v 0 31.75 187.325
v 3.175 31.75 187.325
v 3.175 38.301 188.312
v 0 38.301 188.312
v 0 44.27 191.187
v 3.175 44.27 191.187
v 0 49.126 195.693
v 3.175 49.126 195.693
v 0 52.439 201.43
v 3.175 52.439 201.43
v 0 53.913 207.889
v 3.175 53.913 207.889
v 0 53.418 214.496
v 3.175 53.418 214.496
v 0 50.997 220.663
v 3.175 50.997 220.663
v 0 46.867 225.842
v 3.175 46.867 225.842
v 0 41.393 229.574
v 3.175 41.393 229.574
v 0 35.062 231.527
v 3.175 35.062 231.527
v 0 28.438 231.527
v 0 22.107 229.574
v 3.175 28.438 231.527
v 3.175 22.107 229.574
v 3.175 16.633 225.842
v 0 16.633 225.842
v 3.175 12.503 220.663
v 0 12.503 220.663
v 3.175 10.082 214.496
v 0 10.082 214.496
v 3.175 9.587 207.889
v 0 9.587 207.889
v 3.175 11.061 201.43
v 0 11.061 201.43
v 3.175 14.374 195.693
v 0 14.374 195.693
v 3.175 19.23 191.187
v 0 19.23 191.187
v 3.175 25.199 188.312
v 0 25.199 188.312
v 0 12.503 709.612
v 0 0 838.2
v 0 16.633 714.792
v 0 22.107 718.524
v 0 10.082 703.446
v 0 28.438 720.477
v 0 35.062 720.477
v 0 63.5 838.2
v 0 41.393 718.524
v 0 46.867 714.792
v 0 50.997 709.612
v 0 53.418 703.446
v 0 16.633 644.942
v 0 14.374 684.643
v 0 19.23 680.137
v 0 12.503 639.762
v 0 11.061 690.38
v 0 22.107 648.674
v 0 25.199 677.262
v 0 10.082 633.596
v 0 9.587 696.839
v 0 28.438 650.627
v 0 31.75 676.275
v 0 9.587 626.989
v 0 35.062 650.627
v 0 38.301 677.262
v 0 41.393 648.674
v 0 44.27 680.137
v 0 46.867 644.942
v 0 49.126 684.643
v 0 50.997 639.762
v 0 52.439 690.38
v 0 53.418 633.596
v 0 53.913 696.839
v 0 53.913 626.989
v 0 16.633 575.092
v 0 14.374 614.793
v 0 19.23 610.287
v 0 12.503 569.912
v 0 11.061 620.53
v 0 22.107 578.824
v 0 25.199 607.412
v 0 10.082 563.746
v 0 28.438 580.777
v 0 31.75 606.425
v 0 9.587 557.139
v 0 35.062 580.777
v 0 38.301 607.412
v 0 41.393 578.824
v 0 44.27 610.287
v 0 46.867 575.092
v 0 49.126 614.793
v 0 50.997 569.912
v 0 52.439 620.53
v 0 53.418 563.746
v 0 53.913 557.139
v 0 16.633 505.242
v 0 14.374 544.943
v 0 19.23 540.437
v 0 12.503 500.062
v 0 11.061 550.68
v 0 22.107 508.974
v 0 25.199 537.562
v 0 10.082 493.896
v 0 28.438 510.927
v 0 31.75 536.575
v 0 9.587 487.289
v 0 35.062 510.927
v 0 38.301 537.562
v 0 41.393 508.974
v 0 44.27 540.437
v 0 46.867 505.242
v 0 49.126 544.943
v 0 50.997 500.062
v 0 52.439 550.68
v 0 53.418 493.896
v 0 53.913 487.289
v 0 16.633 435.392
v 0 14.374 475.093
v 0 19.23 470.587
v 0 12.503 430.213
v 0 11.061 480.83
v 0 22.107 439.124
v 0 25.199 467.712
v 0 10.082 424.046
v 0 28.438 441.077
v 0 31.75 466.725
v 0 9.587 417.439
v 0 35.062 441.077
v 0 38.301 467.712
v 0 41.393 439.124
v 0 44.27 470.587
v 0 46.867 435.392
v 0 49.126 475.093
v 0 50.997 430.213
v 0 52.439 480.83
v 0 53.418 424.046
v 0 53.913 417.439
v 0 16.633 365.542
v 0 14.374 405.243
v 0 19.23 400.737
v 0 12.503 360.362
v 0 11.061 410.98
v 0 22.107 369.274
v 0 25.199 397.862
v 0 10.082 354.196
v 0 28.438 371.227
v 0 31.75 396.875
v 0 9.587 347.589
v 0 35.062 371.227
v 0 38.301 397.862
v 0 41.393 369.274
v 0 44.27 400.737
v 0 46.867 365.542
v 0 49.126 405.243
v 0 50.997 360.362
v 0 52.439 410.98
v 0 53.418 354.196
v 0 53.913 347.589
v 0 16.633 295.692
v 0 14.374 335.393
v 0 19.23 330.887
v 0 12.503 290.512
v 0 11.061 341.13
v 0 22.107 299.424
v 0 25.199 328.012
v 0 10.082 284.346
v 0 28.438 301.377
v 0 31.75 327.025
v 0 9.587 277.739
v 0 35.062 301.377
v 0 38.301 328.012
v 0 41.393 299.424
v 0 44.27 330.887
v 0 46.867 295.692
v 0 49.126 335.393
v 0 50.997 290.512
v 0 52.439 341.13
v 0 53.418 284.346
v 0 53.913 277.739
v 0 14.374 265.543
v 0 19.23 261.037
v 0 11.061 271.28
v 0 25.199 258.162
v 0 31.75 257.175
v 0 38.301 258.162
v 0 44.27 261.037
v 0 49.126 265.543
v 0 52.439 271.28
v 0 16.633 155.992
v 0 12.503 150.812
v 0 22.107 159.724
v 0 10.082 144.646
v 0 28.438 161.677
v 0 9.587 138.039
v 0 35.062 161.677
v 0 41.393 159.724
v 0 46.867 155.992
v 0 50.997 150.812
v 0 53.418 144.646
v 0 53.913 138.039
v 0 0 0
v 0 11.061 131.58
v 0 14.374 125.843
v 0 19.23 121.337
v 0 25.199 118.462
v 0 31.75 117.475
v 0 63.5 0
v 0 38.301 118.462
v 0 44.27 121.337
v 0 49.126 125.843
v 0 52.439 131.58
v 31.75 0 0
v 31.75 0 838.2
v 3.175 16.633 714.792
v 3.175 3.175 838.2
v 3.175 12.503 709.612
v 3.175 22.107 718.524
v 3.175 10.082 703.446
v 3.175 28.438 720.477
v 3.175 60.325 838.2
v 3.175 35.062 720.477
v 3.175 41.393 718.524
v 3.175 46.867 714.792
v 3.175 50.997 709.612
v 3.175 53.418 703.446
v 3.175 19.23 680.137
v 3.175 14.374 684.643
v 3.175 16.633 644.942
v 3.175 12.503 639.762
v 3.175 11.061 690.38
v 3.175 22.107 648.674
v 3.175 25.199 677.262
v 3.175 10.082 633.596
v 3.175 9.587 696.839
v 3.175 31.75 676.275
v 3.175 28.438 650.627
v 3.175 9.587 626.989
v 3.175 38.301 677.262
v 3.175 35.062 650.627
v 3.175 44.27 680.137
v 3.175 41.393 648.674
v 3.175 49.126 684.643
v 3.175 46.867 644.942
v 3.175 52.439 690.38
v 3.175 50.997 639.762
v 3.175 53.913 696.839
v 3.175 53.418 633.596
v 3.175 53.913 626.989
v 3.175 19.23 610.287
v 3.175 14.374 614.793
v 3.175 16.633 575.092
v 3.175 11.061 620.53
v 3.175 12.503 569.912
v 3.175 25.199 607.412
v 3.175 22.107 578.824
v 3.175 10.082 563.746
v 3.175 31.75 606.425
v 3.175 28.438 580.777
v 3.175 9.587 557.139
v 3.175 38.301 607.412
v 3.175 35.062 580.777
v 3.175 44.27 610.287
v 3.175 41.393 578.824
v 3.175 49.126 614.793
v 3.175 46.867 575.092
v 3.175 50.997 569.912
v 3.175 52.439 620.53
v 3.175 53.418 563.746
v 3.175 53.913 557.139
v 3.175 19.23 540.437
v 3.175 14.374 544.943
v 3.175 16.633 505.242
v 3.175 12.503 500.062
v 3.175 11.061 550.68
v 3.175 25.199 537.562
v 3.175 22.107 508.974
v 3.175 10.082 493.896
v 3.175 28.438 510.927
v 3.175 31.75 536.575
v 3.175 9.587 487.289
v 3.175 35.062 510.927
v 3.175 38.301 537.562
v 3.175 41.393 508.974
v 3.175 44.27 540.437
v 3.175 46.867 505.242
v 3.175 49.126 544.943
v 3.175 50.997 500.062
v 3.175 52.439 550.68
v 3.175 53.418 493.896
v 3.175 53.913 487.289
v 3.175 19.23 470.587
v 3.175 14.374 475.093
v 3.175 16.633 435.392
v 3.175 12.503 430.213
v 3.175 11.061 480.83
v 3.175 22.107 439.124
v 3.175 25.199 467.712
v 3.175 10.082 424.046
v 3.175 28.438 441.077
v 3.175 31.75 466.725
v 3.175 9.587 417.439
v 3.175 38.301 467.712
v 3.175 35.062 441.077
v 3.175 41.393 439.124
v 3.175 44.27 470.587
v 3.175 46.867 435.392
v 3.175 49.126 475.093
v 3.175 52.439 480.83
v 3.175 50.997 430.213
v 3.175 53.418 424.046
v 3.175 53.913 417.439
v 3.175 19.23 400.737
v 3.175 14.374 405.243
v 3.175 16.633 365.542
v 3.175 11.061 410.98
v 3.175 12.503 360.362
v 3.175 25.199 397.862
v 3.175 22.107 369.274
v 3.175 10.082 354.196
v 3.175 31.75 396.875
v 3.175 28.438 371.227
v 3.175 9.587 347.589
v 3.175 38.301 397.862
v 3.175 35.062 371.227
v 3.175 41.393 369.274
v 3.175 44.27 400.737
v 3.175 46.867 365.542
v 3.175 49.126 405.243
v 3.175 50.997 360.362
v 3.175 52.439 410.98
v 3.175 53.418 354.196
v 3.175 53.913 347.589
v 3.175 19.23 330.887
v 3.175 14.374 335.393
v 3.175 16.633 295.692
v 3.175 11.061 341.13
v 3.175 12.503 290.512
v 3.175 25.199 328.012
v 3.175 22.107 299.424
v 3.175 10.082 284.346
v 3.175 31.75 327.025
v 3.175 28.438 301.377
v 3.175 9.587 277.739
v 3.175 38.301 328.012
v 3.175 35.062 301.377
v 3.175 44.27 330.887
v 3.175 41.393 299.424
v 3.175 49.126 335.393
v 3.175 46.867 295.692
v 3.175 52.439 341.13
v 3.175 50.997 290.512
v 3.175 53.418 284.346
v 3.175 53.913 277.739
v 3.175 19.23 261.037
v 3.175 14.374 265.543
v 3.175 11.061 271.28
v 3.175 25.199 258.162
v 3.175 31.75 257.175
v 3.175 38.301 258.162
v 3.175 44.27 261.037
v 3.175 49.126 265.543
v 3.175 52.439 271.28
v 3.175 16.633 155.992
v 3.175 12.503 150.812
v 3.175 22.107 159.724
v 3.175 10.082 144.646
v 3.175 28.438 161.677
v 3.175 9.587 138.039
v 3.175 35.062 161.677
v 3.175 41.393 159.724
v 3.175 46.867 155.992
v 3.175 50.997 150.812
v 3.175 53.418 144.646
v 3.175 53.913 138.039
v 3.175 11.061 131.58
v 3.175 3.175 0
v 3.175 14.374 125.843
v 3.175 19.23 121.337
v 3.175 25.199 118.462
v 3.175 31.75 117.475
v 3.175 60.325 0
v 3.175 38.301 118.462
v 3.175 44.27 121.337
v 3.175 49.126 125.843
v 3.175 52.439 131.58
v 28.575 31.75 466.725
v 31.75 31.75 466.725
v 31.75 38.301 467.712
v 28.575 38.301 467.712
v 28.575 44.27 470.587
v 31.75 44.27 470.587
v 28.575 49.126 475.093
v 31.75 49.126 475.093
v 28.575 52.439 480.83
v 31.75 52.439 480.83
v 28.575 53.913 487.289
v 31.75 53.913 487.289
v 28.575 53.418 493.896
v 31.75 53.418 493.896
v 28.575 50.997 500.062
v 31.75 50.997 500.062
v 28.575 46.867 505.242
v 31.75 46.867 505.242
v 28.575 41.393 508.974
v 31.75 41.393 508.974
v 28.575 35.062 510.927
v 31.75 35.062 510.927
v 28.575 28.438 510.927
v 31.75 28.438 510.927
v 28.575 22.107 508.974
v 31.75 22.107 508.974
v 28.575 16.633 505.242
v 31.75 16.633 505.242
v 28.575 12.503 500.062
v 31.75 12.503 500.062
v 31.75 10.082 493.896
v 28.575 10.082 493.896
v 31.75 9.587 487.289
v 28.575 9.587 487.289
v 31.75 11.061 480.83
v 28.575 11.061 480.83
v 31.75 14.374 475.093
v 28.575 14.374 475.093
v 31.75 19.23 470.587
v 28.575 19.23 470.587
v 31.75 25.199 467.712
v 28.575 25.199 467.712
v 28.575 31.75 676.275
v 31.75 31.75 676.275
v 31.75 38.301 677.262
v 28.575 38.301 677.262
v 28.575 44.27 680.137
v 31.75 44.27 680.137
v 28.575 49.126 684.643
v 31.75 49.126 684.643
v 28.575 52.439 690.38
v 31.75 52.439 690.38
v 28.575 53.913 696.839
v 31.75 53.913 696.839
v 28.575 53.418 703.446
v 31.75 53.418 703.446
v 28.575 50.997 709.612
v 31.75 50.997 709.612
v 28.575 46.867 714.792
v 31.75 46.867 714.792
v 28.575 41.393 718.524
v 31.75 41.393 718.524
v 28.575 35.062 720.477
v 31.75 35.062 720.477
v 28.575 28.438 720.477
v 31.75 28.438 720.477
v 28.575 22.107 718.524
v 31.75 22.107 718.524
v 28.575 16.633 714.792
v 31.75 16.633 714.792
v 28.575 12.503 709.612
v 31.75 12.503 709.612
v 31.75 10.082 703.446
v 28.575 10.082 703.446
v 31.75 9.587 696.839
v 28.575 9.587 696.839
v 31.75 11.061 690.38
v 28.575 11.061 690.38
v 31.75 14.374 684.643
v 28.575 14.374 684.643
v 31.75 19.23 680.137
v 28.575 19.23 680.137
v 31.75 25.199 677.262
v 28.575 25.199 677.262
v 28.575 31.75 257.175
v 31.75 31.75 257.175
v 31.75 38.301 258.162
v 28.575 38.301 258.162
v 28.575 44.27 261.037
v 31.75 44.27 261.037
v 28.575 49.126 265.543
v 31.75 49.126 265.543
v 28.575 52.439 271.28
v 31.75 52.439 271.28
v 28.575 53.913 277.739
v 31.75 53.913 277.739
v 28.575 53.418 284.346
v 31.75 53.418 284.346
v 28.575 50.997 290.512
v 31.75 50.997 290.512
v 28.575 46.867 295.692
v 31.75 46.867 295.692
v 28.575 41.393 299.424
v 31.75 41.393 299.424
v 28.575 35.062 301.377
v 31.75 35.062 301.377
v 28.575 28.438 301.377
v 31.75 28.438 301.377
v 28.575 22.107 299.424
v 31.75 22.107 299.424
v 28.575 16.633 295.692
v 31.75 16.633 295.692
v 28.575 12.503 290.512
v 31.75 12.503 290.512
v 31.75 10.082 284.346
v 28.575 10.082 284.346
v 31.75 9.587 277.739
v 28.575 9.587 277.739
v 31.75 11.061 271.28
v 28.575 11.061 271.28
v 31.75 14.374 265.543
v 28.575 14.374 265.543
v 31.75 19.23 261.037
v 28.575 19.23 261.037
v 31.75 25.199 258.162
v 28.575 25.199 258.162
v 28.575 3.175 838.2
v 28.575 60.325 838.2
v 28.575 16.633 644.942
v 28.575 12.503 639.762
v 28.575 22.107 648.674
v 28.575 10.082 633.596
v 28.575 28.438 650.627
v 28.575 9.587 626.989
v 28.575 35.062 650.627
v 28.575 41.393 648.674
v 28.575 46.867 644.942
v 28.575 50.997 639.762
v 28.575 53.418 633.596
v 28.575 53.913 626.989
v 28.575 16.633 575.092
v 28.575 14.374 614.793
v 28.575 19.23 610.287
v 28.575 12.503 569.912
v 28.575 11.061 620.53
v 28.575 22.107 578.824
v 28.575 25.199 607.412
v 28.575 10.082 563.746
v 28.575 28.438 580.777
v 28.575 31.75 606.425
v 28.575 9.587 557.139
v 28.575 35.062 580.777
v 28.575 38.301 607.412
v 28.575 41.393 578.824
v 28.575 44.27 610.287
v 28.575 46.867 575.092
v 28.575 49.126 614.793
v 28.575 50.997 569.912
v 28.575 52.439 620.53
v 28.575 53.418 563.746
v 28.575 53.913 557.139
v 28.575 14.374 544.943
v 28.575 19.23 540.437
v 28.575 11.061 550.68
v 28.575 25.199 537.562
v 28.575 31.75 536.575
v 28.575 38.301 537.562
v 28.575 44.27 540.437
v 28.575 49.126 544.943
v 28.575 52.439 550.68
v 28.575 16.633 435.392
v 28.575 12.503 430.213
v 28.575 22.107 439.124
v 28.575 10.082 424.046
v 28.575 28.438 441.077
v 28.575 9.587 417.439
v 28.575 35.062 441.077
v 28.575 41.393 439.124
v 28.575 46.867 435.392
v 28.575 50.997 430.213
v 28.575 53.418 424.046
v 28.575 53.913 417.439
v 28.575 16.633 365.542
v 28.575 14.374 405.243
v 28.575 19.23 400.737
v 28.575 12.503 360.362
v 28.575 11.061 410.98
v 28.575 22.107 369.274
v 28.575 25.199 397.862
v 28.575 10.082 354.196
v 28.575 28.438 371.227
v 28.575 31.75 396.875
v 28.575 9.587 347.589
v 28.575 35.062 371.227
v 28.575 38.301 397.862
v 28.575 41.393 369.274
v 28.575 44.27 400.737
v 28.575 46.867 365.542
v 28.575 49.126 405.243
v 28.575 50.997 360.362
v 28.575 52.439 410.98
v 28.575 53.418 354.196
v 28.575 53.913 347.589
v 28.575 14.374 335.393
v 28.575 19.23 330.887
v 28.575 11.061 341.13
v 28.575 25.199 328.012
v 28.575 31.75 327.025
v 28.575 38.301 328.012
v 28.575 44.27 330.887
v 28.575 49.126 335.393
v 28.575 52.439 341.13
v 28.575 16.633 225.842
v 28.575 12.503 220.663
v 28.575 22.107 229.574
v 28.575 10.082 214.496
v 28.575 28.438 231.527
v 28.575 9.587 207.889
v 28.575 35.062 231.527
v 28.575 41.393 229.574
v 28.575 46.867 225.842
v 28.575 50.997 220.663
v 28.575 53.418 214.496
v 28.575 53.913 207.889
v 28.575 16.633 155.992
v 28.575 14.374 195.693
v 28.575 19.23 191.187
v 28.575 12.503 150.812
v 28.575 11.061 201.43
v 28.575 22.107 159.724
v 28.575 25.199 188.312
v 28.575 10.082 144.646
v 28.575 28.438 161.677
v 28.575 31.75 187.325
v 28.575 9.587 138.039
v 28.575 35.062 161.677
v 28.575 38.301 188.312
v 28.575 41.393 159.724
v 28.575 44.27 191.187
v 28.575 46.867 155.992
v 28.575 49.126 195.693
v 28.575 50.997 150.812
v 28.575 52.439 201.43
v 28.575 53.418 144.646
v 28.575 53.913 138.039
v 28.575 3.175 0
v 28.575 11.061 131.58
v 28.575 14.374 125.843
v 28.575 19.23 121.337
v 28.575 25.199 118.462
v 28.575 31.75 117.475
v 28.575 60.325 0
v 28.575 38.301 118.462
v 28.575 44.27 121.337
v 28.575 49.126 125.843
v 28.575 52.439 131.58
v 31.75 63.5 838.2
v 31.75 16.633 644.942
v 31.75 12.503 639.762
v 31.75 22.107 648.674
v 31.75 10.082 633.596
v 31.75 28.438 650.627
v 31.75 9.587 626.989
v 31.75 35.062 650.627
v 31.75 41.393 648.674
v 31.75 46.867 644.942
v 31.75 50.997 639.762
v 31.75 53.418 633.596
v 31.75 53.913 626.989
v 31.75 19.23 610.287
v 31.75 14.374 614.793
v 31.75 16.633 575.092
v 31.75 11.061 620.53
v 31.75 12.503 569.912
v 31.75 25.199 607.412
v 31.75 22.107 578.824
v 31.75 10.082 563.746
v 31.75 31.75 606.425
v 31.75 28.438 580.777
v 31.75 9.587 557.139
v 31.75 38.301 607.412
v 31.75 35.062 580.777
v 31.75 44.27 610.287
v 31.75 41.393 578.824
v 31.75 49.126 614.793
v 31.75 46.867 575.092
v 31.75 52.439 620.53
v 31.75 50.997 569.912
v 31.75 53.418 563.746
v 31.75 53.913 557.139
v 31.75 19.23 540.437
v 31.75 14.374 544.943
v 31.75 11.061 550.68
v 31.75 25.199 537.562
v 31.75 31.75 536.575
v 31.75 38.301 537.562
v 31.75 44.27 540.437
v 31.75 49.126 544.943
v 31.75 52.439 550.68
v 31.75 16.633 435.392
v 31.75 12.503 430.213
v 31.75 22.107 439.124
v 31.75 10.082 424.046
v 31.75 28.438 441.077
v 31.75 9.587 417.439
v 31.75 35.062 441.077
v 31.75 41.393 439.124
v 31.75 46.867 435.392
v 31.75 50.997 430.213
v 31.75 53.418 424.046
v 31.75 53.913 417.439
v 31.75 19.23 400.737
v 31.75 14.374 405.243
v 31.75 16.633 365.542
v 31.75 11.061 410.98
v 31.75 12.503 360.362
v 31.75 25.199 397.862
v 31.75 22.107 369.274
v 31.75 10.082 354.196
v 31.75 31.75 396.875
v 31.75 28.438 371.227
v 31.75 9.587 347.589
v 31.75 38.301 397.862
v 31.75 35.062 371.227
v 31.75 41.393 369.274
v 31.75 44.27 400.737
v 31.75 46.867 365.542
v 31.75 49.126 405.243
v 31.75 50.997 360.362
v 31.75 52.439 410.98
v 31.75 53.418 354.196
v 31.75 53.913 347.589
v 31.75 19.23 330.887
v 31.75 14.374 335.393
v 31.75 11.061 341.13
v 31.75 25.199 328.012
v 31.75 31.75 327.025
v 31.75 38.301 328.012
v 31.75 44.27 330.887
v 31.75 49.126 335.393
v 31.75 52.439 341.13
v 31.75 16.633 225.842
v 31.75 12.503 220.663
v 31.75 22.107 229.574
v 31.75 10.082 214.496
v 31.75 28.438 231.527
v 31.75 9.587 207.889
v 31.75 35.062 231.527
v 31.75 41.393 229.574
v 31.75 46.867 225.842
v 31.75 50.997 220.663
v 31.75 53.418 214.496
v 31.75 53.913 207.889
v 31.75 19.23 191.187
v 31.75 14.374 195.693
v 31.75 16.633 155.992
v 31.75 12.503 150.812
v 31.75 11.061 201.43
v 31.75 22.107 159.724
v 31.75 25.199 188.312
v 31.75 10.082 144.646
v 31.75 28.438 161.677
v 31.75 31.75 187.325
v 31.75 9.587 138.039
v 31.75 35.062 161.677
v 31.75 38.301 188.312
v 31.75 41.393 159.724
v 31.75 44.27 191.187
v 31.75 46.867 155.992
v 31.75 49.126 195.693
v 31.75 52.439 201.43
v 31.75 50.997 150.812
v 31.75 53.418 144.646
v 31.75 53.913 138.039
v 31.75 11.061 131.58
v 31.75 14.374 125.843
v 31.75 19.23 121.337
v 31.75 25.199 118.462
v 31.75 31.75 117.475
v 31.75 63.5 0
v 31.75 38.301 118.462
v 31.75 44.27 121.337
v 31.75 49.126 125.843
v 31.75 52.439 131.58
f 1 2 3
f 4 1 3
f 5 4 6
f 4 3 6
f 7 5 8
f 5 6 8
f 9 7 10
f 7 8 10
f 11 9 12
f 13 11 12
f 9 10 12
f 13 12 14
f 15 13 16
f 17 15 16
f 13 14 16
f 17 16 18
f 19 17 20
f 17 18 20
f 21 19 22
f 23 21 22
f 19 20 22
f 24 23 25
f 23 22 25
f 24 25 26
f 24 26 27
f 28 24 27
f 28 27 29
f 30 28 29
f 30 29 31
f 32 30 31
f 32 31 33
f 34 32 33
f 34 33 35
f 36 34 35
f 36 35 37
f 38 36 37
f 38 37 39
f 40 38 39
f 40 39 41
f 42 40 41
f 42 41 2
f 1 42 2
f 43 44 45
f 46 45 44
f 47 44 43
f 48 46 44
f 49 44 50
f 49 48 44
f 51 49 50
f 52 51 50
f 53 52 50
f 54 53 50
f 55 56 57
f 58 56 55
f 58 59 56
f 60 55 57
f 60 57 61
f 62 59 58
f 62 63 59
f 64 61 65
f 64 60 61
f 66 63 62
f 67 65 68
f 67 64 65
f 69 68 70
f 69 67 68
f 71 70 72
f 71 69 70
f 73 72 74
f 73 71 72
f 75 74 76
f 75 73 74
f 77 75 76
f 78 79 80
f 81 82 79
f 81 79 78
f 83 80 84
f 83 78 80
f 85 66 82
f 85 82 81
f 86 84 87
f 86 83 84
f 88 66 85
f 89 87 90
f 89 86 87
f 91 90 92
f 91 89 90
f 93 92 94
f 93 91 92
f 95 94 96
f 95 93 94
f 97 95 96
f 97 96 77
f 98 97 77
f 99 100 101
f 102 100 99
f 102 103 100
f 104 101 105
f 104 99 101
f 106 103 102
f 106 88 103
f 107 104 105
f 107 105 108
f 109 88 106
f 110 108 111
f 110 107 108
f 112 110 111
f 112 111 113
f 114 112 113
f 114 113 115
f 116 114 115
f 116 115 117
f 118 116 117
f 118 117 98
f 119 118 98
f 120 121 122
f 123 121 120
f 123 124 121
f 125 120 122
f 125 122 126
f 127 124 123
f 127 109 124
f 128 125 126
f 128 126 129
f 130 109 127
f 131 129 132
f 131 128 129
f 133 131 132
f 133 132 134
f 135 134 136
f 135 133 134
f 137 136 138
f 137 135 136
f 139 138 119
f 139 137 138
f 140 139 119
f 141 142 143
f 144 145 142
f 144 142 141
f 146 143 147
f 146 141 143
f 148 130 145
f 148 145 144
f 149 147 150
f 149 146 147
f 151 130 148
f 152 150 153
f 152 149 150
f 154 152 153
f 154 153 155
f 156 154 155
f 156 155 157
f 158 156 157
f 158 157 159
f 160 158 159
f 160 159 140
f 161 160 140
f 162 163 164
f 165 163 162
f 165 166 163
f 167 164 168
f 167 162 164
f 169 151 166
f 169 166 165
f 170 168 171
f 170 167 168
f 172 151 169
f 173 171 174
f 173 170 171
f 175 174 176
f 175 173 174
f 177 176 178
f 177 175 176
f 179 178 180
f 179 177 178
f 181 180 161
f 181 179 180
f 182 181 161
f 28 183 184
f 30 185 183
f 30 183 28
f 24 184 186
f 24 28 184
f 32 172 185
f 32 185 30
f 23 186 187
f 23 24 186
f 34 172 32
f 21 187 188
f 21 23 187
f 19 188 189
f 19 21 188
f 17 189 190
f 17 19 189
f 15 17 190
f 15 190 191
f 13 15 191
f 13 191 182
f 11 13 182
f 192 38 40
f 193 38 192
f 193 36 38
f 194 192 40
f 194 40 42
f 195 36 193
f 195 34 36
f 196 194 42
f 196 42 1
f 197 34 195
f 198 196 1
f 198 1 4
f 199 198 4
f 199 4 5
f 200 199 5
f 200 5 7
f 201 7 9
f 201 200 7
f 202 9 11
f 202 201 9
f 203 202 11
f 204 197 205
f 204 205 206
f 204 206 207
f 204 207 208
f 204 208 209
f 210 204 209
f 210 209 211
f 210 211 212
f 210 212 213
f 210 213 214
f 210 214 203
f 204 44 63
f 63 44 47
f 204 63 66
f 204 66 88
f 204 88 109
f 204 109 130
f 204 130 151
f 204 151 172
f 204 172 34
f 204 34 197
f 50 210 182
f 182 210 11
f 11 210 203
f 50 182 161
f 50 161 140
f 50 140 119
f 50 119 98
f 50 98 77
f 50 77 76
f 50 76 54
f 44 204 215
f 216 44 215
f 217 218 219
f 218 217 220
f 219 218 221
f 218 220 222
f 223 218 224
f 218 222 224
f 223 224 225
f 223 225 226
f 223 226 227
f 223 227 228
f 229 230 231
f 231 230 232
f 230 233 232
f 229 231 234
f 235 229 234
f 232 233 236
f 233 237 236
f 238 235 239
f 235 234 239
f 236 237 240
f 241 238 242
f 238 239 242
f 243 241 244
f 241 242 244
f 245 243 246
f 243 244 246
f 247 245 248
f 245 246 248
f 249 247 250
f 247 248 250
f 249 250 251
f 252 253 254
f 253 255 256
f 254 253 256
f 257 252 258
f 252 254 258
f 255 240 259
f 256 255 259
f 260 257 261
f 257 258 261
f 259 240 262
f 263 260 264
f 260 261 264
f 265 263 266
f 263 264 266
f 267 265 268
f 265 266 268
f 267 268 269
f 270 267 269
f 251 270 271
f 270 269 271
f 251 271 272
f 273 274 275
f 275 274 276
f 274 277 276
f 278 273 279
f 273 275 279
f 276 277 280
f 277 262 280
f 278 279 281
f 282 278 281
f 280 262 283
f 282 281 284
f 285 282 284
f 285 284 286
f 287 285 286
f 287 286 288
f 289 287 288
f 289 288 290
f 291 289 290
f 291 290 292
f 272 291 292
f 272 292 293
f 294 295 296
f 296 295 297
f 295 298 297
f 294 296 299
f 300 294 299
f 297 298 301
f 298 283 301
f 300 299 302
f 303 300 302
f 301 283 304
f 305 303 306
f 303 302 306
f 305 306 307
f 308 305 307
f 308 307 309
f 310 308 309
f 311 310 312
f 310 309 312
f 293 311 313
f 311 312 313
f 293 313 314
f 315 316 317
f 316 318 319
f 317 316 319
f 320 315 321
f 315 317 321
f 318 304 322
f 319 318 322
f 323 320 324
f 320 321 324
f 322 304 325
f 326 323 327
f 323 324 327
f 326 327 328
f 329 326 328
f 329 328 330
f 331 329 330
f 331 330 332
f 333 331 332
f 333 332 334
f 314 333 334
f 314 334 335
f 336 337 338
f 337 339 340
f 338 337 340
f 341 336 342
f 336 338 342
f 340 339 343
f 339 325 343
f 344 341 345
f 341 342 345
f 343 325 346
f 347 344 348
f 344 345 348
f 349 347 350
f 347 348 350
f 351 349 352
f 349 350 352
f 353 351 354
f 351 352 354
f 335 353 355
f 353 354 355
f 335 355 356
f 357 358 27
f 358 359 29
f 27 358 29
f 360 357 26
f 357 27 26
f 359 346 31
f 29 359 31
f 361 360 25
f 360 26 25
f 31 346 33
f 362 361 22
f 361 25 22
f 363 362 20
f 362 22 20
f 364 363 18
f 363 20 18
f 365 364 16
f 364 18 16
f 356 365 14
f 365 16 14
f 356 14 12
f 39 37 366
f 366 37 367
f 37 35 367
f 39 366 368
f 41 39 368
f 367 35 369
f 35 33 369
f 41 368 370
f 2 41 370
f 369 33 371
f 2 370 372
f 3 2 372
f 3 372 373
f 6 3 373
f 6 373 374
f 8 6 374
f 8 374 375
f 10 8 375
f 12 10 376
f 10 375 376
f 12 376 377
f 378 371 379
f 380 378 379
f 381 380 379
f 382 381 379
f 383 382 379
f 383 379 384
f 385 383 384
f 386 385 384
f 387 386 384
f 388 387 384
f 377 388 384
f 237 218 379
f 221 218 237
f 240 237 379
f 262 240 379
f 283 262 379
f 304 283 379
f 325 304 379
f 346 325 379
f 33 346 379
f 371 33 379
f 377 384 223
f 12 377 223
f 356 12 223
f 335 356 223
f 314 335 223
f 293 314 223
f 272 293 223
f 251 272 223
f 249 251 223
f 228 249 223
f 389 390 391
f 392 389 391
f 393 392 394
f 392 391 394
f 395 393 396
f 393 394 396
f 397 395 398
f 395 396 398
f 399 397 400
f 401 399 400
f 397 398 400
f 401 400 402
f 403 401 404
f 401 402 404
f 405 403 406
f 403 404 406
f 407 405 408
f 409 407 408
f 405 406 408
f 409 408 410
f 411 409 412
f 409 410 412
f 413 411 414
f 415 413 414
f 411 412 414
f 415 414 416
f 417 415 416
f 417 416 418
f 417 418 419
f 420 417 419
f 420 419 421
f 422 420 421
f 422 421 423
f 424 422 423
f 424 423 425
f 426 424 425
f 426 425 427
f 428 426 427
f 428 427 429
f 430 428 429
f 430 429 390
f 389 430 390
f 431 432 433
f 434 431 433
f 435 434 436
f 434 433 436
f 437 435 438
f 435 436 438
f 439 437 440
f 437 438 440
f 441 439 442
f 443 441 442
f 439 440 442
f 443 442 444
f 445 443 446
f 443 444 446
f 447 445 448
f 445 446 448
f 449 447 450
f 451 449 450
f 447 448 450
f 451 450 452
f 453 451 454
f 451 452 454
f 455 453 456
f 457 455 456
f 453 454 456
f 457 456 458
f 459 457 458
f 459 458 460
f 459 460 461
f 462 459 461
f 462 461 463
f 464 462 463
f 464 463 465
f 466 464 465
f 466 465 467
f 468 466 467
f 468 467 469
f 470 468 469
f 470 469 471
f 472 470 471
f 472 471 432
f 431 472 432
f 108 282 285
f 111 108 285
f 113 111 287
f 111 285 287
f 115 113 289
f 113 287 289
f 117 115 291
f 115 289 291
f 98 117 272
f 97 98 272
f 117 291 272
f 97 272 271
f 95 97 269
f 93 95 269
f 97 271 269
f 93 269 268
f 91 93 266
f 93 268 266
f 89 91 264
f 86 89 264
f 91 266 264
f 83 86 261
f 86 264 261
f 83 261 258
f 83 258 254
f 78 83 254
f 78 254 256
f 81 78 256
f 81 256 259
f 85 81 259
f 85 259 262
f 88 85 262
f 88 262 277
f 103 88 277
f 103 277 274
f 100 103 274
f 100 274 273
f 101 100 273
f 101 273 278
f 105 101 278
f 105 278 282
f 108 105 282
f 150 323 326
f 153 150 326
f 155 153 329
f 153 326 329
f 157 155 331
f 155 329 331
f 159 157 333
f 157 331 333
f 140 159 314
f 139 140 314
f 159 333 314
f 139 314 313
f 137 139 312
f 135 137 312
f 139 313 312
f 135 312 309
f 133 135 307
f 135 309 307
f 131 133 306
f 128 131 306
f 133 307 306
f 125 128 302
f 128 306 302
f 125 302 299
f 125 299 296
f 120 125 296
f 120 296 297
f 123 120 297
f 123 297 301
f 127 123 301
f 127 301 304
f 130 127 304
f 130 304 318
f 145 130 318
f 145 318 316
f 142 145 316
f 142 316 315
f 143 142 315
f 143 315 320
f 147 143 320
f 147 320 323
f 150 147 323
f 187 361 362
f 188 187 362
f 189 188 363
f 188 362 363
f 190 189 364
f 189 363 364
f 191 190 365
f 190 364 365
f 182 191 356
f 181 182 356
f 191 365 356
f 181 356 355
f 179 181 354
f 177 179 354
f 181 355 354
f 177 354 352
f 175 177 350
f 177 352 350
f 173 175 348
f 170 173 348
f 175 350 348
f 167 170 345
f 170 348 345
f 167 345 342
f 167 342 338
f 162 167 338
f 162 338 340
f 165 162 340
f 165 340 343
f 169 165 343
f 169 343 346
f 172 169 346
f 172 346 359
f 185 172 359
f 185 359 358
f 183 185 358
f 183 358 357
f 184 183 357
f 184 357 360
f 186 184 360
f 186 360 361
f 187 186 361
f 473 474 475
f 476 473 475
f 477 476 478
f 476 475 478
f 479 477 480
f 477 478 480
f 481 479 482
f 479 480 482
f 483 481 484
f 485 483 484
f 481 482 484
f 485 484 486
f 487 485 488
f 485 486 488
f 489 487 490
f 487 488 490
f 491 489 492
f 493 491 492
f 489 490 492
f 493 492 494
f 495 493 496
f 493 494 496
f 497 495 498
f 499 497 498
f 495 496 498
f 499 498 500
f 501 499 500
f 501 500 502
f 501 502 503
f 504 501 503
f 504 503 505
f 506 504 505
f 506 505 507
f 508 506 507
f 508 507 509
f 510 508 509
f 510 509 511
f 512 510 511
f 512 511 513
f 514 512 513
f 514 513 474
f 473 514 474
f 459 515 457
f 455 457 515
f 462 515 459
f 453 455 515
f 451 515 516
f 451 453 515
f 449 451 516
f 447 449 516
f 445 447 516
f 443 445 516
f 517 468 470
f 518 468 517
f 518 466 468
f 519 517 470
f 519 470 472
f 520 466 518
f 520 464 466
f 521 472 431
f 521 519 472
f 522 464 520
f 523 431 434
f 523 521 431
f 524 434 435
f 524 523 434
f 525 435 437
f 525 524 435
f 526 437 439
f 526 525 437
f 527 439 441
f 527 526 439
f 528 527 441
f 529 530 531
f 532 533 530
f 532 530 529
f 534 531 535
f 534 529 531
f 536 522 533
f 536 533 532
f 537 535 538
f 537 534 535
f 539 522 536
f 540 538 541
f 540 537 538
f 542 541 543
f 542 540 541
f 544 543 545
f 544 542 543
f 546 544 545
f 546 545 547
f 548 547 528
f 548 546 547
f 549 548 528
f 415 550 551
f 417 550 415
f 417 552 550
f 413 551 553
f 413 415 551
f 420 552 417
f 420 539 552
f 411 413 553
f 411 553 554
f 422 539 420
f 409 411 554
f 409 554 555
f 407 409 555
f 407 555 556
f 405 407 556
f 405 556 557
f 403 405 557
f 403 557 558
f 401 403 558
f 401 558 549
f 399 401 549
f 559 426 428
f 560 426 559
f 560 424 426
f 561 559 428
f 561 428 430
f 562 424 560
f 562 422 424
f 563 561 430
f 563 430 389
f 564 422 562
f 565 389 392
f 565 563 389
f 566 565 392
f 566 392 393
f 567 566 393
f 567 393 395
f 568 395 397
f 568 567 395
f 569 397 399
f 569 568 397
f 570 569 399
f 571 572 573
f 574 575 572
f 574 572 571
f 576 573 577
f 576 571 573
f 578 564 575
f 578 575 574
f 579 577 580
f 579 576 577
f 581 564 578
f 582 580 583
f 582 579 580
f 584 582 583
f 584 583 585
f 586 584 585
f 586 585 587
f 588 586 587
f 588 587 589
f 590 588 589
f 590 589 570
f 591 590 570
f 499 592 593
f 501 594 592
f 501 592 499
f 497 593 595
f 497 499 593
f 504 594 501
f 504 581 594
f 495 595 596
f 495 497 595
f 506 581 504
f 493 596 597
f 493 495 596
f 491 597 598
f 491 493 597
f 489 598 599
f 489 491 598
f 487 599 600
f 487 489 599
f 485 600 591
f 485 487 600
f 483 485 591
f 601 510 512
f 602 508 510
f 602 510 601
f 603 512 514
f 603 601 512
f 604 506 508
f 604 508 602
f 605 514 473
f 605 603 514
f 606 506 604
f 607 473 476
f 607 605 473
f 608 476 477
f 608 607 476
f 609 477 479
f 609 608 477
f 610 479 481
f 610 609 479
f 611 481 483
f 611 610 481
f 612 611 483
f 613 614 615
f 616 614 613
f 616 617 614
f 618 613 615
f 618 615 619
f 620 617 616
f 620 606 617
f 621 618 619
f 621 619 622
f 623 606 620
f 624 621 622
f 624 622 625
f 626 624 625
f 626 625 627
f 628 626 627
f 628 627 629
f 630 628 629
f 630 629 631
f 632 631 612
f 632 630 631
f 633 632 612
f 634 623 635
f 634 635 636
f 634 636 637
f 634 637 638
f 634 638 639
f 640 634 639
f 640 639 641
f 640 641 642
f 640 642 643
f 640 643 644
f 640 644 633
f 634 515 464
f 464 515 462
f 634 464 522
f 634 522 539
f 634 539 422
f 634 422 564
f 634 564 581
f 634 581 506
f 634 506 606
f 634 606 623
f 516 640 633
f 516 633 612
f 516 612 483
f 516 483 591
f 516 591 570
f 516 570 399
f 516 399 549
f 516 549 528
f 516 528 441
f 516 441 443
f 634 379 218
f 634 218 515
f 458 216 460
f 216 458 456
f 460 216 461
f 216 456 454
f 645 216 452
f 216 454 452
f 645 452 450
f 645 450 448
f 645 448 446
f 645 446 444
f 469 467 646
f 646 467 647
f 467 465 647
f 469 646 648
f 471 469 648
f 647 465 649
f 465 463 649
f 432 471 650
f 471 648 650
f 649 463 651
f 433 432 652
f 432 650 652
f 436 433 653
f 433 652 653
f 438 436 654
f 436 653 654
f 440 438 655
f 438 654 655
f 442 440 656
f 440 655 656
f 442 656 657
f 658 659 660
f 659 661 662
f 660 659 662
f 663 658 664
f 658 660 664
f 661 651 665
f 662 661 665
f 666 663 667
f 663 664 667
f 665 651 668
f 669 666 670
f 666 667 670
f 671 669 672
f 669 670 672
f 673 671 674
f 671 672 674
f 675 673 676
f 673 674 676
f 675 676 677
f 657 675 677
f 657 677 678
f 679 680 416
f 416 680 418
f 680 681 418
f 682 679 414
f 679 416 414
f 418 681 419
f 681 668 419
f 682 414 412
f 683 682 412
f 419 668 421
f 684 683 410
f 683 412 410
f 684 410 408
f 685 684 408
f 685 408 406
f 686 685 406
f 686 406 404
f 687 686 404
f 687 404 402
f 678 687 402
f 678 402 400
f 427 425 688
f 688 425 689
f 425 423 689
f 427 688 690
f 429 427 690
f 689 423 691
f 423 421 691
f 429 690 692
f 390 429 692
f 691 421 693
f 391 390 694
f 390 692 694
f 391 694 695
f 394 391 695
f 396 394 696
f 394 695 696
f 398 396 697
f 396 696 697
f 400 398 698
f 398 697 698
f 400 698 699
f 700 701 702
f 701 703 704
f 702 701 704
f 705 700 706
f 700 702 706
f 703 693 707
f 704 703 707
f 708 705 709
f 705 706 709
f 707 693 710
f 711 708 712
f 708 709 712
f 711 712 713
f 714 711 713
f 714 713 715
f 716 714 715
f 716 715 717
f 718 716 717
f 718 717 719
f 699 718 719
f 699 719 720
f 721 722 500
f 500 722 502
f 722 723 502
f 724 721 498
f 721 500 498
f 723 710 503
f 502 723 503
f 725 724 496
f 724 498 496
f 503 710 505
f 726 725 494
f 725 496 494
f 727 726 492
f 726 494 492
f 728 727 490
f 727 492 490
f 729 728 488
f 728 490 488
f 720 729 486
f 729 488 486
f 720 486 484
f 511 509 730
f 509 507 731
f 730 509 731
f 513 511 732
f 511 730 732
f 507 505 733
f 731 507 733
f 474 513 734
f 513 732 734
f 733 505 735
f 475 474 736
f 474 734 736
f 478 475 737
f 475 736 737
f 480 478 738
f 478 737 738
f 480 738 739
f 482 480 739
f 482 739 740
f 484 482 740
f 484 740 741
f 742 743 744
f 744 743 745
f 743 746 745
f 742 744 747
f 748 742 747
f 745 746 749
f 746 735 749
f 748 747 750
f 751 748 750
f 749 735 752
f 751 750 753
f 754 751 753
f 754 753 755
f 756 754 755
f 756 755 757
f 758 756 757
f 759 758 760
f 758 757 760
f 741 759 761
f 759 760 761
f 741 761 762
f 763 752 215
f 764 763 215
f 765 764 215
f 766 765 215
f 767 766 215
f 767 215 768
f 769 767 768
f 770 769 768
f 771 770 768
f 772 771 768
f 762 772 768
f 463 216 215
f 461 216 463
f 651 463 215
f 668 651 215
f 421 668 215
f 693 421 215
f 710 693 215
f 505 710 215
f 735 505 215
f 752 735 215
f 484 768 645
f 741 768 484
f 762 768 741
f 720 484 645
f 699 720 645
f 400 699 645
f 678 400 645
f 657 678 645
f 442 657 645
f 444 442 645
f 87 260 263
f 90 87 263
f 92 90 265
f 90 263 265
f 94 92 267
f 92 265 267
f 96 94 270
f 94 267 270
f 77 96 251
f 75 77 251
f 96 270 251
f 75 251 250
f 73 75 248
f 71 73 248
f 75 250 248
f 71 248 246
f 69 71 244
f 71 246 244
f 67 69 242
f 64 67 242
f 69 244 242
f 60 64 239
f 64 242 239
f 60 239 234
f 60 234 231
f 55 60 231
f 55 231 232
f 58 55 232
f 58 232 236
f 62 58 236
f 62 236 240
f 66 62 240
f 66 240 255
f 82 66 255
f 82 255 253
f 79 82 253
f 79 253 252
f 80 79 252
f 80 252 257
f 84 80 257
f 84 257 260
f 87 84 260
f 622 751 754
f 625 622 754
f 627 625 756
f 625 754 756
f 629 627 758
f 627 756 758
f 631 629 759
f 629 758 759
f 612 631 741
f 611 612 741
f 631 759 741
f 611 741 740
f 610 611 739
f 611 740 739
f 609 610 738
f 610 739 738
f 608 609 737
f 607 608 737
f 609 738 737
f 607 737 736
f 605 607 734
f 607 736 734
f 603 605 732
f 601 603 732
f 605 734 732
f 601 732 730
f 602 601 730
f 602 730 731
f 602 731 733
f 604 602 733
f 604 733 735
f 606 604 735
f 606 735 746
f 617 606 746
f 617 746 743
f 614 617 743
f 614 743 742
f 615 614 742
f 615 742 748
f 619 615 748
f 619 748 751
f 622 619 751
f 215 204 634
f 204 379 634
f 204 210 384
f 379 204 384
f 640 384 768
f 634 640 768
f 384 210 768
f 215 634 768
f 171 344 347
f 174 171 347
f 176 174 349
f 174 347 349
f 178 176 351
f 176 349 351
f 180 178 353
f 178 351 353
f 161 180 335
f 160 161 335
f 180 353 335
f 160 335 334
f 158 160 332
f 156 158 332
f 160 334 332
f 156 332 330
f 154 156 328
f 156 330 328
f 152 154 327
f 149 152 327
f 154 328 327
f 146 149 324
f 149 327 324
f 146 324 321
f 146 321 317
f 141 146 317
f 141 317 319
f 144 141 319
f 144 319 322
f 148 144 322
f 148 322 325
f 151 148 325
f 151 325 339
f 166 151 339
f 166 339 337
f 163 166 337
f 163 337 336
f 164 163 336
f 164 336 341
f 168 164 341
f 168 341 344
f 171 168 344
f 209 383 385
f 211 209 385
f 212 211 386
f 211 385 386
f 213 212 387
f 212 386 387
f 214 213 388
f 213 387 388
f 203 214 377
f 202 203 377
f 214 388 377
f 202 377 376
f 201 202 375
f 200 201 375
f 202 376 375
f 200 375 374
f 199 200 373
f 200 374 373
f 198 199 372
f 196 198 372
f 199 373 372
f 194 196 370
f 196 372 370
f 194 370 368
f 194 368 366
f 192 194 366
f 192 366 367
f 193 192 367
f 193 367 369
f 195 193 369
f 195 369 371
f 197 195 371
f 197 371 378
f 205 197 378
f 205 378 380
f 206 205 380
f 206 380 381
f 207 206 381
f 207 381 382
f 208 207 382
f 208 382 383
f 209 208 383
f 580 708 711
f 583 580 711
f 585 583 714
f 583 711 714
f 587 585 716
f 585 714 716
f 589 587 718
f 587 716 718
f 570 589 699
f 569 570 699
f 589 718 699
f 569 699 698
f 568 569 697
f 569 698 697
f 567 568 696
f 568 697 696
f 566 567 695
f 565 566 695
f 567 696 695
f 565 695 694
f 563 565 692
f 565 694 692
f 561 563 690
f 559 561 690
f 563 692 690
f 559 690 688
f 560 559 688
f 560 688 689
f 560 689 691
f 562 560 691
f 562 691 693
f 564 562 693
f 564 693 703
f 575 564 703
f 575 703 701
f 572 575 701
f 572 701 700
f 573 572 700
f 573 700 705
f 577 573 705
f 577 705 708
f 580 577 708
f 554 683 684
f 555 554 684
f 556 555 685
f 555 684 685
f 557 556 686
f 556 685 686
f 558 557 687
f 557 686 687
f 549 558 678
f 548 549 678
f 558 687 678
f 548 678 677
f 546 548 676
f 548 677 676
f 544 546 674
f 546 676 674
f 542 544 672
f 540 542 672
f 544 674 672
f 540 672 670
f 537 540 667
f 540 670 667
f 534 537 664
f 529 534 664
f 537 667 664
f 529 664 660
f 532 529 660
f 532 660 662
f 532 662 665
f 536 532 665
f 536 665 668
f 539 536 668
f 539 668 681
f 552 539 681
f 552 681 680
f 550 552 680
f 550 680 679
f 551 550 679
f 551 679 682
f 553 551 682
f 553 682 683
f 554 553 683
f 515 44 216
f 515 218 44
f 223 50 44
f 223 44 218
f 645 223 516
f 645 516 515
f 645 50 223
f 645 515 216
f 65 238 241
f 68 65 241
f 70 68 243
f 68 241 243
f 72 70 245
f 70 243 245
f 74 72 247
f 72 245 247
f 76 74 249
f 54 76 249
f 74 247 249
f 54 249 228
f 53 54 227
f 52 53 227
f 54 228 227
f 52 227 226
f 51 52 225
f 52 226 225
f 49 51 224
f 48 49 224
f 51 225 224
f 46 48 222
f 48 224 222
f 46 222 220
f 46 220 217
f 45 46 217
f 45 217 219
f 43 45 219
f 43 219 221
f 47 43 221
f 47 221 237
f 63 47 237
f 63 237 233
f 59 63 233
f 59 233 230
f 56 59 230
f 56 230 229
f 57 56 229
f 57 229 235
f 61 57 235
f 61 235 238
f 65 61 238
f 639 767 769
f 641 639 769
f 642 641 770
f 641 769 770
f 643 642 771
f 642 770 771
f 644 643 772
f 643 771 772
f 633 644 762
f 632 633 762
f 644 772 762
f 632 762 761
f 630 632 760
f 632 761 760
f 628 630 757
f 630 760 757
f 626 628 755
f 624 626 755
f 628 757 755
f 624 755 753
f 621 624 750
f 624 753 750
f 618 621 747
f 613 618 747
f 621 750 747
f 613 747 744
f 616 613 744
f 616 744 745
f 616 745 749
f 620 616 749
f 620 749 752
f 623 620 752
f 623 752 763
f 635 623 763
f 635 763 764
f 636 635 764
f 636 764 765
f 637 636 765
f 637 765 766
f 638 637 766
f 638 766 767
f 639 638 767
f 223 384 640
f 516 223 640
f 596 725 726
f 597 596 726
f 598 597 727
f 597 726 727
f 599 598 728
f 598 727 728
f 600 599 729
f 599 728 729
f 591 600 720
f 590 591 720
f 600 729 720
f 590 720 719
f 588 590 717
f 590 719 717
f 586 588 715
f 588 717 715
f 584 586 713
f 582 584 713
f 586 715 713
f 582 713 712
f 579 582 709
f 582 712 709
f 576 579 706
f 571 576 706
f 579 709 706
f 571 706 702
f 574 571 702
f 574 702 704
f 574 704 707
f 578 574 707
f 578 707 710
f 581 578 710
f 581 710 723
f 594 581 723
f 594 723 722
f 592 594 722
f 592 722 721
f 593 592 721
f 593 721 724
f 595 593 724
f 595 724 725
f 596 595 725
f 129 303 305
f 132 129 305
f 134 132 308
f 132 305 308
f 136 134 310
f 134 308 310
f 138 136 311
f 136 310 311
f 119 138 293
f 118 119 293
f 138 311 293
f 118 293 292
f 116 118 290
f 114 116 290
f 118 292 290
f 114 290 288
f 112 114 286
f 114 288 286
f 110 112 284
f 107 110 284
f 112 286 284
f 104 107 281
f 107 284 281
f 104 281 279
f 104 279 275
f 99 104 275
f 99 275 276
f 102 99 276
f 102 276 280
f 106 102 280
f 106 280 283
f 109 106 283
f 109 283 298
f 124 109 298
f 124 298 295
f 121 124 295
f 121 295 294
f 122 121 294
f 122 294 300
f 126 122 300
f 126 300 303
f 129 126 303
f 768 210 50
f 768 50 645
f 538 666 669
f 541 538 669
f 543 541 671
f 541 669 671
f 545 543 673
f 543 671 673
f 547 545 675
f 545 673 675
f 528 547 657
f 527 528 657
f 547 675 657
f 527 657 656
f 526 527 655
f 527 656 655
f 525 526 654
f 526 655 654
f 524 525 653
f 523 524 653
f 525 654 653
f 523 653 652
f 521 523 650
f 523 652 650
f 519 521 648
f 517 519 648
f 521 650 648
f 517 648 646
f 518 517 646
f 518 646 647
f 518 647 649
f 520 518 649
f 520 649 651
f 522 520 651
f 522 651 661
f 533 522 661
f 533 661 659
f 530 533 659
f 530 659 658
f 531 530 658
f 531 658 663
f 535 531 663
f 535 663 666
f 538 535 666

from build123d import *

# Parameters (mm, degrees)
SKETCH1_W           = 31.75
SKETCH1_H           = 63.5
SKETCH1_W_2         = 25.4
SKETCH1_H_2         = 57.15
BOSS_EXTRUDE1_DEPTH = 838.2
SKETCH2_R           = 22.225
CUT_EXTRUDE1_DEPTH  = 31.75


with BuildPart() as part:
    # Sketch1 → Boss-Extrude1 (new body)
    with BuildSketch(Plane.XY):
        with Locations((15.875, 31.75)):
            Rectangle(SKETCH1_W, SKETCH1_H)
        with Locations((15.875, 31.75)):
            Rectangle(SKETCH1_W_2, SKETCH1_H_2, mode=Mode.SUBTRACT)
    extrude(amount=BOSS_EXTRUDE1_DEPTH)

    # Sketch2 → Cut-Extrude1 (cut)
    with BuildSketch(Plane(origin=(31.75, 0, 0), x_dir=(0, 0, -1), z_dir=(1, 0, 0))):
        with Locations((-698.5, 31.75)):
            Circle(SKETCH2_R)
        with Locations((-628.65, 31.75)):
            Circle(SKETCH2_R)
        with Locations((-558.8, 31.75)):
            Circle(SKETCH2_R)
        with Locations((-488.95, 31.75)):
            Circle(SKETCH2_R)
        with Locations((-419.1, 31.75)):
            Circle(SKETCH2_R)
        with Locations((-349.25, 31.75)):
            Circle(SKETCH2_R)
        with Locations((-279.4, 31.75)):
            Circle(SKETCH2_R)
        with Locations((-209.55, 31.75)):
            Circle(SKETCH2_R)
        with Locations((-139.7, 31.75)):
            Circle(SKETCH2_R)
    extrude(amount=-CUT_EXTRUDE1_DEPTH, mode=Mode.SUBTRACT)


solid = part.part
